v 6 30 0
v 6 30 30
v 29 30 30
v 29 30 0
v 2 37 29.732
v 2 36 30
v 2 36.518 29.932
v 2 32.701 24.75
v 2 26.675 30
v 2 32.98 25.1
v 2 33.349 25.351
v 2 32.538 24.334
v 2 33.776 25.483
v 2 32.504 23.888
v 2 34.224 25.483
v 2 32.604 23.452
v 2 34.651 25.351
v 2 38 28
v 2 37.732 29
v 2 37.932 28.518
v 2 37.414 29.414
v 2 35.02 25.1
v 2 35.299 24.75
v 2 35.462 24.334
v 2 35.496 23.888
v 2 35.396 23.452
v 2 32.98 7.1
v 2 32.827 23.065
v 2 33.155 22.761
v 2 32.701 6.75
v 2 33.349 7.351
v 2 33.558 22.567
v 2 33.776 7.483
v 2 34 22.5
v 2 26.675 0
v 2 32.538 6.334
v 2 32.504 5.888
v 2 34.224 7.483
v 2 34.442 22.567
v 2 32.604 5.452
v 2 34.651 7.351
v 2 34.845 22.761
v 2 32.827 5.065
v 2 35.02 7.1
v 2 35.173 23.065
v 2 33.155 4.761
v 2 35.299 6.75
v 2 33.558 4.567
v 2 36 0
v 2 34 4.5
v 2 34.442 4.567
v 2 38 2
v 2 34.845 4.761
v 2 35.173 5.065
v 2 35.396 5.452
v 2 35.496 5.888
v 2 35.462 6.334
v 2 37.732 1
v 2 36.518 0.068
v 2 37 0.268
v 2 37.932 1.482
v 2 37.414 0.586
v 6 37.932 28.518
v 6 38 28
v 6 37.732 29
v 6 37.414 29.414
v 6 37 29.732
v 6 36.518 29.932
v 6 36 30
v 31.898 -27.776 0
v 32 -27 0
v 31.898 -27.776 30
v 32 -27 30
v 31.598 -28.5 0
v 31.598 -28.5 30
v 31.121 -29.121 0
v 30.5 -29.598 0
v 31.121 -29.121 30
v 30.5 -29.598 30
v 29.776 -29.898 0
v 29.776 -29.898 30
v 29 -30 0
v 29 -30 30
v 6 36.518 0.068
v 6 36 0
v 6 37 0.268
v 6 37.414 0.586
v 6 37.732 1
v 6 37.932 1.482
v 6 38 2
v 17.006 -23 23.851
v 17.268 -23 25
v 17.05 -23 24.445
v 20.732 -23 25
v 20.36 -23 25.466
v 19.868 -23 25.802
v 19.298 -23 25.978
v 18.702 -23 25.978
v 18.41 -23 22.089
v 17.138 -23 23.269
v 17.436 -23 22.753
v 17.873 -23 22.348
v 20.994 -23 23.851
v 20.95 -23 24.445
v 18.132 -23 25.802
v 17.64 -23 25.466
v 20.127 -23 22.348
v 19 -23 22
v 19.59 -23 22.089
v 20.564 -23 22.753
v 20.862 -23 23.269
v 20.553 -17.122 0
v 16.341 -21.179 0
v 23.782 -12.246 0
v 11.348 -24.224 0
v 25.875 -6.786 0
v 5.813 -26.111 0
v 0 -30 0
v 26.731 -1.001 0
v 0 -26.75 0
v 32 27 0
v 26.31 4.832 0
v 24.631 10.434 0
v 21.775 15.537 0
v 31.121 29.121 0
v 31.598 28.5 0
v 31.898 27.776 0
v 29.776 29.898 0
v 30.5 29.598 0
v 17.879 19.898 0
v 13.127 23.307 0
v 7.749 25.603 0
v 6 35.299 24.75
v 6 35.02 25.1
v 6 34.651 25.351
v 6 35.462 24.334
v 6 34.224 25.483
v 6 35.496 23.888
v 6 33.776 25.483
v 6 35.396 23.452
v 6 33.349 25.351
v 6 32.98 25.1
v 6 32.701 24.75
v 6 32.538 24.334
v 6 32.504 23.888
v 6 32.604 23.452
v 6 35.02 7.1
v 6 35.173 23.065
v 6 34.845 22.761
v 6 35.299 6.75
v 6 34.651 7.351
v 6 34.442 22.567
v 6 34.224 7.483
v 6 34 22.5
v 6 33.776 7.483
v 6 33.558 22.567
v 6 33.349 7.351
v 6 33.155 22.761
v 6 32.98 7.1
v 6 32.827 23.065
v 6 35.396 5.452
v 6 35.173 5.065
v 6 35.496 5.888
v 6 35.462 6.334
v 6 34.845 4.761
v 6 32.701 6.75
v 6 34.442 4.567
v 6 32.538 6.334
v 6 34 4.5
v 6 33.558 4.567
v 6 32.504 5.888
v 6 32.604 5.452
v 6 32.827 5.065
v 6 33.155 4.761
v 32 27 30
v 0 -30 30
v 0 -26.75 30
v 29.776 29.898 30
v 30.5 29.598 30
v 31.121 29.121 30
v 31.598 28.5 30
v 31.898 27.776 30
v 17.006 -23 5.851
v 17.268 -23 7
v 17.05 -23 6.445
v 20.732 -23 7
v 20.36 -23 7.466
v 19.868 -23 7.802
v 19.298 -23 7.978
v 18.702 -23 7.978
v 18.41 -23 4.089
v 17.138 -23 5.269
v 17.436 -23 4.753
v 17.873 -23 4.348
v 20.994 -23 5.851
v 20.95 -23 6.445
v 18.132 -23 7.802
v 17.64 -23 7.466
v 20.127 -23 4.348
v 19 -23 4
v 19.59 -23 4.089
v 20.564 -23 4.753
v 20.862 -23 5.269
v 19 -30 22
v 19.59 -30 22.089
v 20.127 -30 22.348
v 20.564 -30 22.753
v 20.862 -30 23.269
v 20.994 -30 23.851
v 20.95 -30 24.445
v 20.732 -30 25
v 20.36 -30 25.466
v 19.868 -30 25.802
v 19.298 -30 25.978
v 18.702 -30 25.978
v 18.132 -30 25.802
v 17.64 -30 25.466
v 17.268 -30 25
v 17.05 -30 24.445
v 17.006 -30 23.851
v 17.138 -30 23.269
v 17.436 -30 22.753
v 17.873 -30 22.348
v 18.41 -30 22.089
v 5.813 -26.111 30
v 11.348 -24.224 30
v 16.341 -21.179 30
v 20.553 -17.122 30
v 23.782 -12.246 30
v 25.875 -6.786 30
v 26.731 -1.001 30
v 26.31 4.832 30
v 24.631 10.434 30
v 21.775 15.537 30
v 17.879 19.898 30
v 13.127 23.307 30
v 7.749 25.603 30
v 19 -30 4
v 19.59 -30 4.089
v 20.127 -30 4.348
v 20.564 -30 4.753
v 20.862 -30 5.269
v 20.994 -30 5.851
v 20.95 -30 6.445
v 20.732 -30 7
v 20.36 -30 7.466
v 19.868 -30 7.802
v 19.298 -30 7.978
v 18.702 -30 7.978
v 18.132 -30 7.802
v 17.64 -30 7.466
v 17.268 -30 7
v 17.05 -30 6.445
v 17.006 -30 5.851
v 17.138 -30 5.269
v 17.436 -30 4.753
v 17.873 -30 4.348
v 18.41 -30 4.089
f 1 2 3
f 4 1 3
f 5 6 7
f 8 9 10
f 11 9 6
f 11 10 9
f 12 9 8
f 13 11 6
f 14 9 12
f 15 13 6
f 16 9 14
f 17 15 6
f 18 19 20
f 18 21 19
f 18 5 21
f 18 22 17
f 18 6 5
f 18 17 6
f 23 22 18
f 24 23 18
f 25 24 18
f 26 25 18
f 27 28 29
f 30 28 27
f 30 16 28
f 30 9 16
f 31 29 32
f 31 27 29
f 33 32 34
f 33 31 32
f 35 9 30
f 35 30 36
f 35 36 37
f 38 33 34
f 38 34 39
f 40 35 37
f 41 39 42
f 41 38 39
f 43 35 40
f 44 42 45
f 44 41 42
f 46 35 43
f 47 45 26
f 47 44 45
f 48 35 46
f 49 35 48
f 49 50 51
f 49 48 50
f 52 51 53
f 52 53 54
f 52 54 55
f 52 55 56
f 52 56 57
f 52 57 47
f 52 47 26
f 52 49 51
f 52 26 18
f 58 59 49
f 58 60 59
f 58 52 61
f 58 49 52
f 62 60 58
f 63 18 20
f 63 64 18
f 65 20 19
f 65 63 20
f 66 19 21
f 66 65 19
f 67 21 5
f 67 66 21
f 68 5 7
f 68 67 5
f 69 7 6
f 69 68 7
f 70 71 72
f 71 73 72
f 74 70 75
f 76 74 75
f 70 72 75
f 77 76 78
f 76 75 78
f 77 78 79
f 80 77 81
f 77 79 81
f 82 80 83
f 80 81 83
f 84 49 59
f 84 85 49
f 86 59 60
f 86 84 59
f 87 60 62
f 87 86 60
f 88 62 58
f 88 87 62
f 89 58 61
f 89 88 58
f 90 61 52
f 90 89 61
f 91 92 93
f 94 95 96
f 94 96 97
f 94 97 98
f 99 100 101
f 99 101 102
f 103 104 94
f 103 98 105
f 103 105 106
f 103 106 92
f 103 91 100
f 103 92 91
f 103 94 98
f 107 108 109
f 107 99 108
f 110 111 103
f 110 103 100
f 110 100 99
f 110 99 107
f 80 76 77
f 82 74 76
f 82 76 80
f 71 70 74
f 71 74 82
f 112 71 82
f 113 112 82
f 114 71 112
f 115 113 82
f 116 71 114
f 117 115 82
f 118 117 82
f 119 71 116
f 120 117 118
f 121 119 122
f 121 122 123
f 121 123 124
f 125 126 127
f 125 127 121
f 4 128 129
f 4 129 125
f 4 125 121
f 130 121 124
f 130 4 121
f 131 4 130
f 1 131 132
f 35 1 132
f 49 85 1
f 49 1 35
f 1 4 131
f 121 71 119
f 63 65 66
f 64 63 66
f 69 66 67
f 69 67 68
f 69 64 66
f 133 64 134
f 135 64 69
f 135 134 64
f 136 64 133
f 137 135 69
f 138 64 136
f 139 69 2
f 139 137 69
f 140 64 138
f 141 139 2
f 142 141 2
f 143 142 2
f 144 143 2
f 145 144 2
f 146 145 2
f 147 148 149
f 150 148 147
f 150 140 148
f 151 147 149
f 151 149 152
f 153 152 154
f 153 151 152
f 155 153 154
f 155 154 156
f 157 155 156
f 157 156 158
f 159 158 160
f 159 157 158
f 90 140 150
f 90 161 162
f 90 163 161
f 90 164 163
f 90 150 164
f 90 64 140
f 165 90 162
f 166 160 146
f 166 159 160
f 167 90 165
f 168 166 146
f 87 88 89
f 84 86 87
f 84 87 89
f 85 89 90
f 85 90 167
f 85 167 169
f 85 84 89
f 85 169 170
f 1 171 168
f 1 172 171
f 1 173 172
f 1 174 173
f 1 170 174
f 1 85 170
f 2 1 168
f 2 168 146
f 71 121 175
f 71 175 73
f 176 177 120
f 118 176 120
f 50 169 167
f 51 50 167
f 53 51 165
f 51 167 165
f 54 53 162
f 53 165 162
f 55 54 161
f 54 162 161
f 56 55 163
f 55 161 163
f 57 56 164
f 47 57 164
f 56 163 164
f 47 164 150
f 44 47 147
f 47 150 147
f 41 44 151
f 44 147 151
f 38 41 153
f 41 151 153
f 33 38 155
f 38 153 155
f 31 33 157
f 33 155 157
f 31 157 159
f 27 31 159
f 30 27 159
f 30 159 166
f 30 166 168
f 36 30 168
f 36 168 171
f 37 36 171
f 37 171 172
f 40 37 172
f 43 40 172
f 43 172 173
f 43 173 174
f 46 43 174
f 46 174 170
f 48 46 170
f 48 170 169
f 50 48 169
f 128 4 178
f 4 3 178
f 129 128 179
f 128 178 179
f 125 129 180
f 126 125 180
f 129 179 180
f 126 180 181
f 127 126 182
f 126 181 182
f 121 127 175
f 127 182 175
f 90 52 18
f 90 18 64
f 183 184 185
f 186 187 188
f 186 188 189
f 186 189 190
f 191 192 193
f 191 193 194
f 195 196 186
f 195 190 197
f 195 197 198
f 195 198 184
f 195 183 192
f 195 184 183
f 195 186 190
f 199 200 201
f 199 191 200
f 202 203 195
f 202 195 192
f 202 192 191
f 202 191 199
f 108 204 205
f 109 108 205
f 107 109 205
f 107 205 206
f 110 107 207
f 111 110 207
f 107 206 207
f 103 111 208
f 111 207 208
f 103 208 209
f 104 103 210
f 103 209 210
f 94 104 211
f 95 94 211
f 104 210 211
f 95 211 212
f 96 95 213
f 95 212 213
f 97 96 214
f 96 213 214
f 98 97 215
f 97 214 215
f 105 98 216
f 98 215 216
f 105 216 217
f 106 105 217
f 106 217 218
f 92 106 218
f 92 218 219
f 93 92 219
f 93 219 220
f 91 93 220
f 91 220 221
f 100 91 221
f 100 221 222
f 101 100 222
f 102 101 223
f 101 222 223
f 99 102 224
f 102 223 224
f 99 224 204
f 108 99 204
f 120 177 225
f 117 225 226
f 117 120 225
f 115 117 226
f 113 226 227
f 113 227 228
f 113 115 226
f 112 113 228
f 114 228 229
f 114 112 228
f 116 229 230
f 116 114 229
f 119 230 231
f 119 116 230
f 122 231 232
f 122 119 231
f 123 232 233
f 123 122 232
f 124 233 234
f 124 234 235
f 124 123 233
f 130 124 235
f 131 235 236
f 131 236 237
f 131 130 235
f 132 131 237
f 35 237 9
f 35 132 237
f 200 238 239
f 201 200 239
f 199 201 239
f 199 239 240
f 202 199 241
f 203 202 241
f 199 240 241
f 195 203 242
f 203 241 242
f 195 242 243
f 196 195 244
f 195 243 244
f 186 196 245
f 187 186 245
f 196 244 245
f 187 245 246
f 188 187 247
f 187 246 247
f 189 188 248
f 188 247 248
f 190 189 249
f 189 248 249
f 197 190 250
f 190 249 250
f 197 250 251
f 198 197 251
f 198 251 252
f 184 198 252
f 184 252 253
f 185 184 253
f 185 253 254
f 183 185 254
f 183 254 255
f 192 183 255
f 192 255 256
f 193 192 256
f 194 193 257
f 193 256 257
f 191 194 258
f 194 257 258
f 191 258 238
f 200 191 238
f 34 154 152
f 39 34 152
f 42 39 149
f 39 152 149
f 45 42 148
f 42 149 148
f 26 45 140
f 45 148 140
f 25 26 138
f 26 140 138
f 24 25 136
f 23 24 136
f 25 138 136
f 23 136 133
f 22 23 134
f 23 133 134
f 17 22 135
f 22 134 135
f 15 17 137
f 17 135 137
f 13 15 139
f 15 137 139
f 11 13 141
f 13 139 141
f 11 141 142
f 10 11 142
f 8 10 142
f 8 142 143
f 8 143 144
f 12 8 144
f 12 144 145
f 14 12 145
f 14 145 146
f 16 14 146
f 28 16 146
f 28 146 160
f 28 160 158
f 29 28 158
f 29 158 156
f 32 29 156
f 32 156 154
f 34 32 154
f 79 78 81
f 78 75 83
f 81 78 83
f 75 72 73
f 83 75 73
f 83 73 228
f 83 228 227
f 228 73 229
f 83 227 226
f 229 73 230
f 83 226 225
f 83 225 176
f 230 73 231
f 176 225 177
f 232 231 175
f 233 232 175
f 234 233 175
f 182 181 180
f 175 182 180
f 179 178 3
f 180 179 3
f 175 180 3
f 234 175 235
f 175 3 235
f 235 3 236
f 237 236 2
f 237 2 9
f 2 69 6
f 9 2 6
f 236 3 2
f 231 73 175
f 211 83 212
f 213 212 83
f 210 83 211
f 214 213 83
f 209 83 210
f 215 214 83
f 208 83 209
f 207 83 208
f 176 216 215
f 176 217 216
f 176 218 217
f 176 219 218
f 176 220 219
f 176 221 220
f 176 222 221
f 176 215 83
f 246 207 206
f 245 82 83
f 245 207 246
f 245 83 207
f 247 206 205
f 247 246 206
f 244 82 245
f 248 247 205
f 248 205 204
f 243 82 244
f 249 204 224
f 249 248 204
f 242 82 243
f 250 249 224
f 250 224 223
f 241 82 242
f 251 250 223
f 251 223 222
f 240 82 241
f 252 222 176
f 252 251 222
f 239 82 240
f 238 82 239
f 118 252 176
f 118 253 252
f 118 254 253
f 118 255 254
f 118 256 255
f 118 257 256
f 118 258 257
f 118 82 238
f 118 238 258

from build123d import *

# Parameters (mm, degrees)
EXTRUDE_1_DEPTH     = 30
FILLET_1_R          = 3
SKETCH_3_R          = 2
CUT_EXTRUDE_1_DEPTH = 7
SKETCH_4_R          = 1.5
CUT_EXTRUDE_2_DEPTH = 62.546730214
SKETCH_5_W          = 141.789042775
SKETCH_5_H          = 177.448562515
CUT_EXTRUDE_3_DEPTH = 59.034472514
FILLET_2_R          = 2


with BuildPart() as part:
    # 草图1 → 凸台-拉伸1 (new body)
    with BuildSketch(Plane.XY):
        with BuildLine():
            Line((-32, 30), (-6, 30))
            Line((-6, 30), (-6, 38))
            Line((-6, 38), (-2, 38))
            Line((-2, 38), (-2, 28.659348025))
            Line((-2, 28.659348025), (-2, 26.675128866))
            ThreePointArc((-2, 26.675128866), (0, -26.75), (2, 26.675128866))
            Line((2, 26.675128866), (2, 28.659348025))
            Line((2, 28.659348025), (2, 38))
            Line((2, 38), (6, 38))
            Line((6, 38), (6, 30))
            Line((6, 30), (32, 30))
            Line((32, 30), (32, -30))
            Line((32, -30), (-32, -30))
            Line((-32, -30), (-32, 30))
        make_face()
    extrude(amount=EXTRUDE_1_DEPTH)

    # 圆角1
    fillet_1_edges = [part.edges().sort_by_distance(p)[0] for p in [
        (32, -30, 15),
        (-32, -30, 15),
        (-32, 30, 15),
        (32, 30, 15),
    ]]
    fillet(fillet_1_edges, radius=FILLET_1_R)

    # 草图3 → 切除-拉伸1 (cut)
    with BuildSketch(Plane.XZ.offset(30)):
        with Locations(Location((19, 24, 0), (0, 0, 270))):
            Circle(SKETCH_3_R)
        with Locations(Location((19, 6, 0), (0, 0, 270))):
            Circle(SKETCH_3_R)
    extrude(amount=-CUT_EXTRUDE_1_DEPTH, mode=Mode.SUBTRACT)

    # 草图4 → 切除-拉伸2 (cut, through all)
    with BuildSketch(Plane(origin=(6, 0, 0), x_dir=(0, 0, -1), z_dir=(1, 0, 0))):
        with Locations((-24, 34)):
            Circle(SKETCH_4_R)
        with Locations((-6, 34)):
            Circle(SKETCH_4_R)
    extrude(amount=-CUT_EXTRUDE_2_DEPTH, mode=Mode.SUBTRACT)

    # 草图5 → 切除-拉伸3 (cut, through all)
    with BuildSketch(Plane(origin=(0, 0, 0), x_dir=(0, 0, -1), z_dir=(1, 0, 0))):
        with Locations((-47.884475127, 49.870130309)):
            Rectangle(SKETCH_5_W, SKETCH_5_H)
    extrude(amount=-CUT_EXTRUDE_3_DEPTH, mode=Mode.SUBTRACT)

    # 圆角2
    fillet_2_edges = [part.edges().sort_by_distance(p)[0] for p in [
        (4, 38, 30),
        (4, 38, 0),
    ]]
    fillet(fillet_2_edges, radius=FILLET_2_R)


solid = part.part
